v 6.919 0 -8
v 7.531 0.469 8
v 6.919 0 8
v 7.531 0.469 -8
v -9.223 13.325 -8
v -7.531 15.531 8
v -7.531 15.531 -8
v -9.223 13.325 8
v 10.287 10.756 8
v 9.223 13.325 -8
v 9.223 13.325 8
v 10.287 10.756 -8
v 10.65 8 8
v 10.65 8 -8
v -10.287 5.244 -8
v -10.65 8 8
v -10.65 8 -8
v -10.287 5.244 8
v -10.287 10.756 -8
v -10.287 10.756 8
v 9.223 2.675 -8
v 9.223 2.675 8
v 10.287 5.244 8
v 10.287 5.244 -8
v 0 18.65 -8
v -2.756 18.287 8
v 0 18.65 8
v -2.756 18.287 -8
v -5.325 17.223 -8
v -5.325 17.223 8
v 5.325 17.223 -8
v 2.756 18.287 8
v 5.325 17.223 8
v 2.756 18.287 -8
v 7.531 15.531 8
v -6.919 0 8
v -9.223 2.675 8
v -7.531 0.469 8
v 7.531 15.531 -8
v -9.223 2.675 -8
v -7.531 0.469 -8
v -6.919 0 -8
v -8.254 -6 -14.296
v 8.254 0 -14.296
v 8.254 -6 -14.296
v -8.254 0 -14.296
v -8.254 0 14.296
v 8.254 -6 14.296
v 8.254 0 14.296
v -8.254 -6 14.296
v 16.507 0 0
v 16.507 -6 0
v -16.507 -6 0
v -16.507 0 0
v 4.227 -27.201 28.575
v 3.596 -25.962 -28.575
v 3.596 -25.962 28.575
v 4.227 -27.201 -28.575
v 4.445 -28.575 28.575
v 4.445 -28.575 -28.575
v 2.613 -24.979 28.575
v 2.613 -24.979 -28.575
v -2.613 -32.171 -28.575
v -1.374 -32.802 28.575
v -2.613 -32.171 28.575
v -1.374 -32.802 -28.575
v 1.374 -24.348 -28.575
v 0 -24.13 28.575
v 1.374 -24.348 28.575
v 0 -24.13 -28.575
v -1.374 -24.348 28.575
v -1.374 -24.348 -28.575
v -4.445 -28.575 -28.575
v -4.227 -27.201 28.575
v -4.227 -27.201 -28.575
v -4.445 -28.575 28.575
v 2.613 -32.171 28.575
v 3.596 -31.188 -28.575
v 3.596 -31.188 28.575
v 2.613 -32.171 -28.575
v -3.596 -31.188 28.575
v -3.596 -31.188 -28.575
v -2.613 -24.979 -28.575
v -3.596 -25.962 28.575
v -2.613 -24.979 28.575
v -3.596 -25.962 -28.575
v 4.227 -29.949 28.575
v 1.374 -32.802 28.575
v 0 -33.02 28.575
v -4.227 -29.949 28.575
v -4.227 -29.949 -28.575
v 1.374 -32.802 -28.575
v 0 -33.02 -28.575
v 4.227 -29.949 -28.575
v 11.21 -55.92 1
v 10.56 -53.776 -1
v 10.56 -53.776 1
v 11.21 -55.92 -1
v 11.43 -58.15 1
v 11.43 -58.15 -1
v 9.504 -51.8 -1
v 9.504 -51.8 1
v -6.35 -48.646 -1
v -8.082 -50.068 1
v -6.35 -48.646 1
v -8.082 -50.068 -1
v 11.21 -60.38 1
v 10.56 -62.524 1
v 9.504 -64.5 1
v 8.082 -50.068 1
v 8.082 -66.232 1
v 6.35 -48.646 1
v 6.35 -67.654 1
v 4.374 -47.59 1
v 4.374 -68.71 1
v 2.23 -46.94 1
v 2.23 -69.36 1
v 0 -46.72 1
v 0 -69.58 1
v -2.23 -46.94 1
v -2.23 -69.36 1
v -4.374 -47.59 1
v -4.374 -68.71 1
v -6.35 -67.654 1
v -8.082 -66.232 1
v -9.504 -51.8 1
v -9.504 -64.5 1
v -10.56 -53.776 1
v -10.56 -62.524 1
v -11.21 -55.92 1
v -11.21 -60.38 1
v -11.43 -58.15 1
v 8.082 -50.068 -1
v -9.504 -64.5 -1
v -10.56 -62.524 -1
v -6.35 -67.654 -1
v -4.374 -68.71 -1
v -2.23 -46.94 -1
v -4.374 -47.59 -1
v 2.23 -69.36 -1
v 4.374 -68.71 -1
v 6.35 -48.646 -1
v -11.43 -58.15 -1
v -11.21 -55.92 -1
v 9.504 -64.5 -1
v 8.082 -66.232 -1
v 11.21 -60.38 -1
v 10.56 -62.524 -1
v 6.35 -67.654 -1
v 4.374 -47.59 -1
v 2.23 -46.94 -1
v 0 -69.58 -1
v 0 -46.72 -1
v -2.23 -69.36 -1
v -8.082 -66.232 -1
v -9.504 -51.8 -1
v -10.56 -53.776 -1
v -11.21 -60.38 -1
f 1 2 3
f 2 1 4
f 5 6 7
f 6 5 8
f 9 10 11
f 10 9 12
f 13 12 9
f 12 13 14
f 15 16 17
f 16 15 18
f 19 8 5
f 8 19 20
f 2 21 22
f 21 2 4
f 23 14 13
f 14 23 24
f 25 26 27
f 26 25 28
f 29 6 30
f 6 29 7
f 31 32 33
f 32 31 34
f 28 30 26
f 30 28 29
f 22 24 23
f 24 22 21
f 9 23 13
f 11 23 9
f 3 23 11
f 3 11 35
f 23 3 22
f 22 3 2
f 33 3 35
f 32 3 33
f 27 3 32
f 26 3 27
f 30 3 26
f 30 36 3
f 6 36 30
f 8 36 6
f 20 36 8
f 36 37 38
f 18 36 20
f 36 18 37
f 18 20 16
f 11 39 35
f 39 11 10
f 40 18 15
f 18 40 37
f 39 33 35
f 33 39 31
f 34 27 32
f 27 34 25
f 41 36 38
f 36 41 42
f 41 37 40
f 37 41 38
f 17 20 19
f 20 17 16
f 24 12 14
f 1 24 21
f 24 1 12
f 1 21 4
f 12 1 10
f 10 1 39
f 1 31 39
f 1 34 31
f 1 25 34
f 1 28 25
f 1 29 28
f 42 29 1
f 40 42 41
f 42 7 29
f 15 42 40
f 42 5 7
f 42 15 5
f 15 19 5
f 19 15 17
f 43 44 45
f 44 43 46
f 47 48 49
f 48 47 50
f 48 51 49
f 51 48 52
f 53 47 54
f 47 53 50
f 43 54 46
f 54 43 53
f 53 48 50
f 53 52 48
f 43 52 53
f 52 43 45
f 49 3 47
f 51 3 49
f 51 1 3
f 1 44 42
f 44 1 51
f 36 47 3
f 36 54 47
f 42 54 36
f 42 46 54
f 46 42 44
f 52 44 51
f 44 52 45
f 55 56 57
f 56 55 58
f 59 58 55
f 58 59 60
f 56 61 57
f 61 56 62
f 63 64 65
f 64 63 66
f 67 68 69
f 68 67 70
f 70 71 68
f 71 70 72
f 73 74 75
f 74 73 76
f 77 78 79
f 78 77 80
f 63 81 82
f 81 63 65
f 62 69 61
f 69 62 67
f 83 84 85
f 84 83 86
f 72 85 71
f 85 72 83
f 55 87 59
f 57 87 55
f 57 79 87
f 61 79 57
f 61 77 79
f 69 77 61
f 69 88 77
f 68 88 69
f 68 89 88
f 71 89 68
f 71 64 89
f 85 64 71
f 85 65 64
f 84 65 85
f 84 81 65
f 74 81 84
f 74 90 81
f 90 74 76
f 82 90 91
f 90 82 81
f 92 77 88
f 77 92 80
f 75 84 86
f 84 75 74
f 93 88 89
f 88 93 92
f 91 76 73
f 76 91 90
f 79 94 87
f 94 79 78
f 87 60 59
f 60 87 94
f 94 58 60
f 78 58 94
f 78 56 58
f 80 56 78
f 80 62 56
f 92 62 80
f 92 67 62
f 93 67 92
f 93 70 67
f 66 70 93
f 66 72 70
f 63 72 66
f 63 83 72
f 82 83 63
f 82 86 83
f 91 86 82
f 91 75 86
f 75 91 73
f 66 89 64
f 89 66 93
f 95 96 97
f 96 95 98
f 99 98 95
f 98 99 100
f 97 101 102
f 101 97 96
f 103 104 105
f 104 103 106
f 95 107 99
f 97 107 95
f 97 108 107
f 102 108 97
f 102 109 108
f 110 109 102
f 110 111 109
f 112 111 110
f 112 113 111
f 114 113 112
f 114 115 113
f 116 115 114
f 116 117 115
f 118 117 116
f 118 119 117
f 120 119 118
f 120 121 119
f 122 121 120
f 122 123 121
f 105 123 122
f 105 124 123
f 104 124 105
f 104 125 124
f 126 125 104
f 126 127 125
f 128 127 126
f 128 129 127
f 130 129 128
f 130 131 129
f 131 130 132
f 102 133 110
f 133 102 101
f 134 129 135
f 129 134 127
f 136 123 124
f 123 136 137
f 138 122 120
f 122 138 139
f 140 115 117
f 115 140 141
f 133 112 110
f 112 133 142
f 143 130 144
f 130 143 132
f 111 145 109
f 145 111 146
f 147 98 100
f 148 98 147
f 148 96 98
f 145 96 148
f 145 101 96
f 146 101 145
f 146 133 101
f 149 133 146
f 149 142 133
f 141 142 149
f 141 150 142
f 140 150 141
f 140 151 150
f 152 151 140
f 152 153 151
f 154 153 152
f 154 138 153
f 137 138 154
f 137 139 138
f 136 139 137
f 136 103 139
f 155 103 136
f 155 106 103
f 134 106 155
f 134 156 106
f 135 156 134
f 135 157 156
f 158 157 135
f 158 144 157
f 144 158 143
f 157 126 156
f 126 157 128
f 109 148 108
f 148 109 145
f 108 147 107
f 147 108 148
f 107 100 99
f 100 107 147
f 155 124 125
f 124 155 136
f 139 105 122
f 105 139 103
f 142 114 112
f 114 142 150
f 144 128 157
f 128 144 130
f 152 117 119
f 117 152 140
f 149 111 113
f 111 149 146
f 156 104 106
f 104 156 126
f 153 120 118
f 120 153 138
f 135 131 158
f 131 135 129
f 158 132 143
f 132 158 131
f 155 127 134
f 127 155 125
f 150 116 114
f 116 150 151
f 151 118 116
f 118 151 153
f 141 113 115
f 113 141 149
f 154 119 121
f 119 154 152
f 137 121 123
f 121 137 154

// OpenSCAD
// Auto-generated by scripts/author_from_manifest.py (Phase D.3).
// Source: data/phase_d_manifest.json (sku_intent='viking-vk457-concealed-200f').
// Do not hand-edit — regenerate from the manifest.
//
// @part viking_vk457_concealed_200f
// @kind sprinkler_head
// @category head.pendant.k56
// @display-name "Viking VK457 Concealed Pendent K5.6 200°F"
// @mfg viking_group
// @mfg-pn VK457
// @listing UL FM
// @hazard-classes LH OH1
// @price-usd 27.40
// @install-minutes 10
// @crew journeyman
// @k-factor 5.6
// @orientation pendant
// @response quick
// @temperature 200F
// @param size_in number default=0.5 label="Size" unit="in"
// @port inlet position=[0,0.014,0] direction=[0,1,0] style=NPT_threaded size_in=0.5 role=drop

size_in = 0.5;
k_factor = 5.6;

length_mm   = 57.15;
body_dia_mm = 25.40;
thread_od   = 21.3;
thread_len  = 16;
deflector_d = body_dia_mm * 0.9;

 union() {
    translate([0, thread_len/2, 0])
        cylinder(h = thread_len, d = thread_od, center = true, $fn = 24);
    translate([0, -3, 0])
        rotate([90, 0, 0])
        cylinder(h = 6, d = thread_od * 1.55, $fn = 6, center = true);
    translate([0, -length_mm/2, 0])
        cylinder(h = length_mm, d = body_dia_mm * 0.35, center = true, $fn = 20);
    translate([0, -length_mm - 1, 0])
        cylinder(h = 2, d = deflector_d, center = true, $fn = 32);
}
